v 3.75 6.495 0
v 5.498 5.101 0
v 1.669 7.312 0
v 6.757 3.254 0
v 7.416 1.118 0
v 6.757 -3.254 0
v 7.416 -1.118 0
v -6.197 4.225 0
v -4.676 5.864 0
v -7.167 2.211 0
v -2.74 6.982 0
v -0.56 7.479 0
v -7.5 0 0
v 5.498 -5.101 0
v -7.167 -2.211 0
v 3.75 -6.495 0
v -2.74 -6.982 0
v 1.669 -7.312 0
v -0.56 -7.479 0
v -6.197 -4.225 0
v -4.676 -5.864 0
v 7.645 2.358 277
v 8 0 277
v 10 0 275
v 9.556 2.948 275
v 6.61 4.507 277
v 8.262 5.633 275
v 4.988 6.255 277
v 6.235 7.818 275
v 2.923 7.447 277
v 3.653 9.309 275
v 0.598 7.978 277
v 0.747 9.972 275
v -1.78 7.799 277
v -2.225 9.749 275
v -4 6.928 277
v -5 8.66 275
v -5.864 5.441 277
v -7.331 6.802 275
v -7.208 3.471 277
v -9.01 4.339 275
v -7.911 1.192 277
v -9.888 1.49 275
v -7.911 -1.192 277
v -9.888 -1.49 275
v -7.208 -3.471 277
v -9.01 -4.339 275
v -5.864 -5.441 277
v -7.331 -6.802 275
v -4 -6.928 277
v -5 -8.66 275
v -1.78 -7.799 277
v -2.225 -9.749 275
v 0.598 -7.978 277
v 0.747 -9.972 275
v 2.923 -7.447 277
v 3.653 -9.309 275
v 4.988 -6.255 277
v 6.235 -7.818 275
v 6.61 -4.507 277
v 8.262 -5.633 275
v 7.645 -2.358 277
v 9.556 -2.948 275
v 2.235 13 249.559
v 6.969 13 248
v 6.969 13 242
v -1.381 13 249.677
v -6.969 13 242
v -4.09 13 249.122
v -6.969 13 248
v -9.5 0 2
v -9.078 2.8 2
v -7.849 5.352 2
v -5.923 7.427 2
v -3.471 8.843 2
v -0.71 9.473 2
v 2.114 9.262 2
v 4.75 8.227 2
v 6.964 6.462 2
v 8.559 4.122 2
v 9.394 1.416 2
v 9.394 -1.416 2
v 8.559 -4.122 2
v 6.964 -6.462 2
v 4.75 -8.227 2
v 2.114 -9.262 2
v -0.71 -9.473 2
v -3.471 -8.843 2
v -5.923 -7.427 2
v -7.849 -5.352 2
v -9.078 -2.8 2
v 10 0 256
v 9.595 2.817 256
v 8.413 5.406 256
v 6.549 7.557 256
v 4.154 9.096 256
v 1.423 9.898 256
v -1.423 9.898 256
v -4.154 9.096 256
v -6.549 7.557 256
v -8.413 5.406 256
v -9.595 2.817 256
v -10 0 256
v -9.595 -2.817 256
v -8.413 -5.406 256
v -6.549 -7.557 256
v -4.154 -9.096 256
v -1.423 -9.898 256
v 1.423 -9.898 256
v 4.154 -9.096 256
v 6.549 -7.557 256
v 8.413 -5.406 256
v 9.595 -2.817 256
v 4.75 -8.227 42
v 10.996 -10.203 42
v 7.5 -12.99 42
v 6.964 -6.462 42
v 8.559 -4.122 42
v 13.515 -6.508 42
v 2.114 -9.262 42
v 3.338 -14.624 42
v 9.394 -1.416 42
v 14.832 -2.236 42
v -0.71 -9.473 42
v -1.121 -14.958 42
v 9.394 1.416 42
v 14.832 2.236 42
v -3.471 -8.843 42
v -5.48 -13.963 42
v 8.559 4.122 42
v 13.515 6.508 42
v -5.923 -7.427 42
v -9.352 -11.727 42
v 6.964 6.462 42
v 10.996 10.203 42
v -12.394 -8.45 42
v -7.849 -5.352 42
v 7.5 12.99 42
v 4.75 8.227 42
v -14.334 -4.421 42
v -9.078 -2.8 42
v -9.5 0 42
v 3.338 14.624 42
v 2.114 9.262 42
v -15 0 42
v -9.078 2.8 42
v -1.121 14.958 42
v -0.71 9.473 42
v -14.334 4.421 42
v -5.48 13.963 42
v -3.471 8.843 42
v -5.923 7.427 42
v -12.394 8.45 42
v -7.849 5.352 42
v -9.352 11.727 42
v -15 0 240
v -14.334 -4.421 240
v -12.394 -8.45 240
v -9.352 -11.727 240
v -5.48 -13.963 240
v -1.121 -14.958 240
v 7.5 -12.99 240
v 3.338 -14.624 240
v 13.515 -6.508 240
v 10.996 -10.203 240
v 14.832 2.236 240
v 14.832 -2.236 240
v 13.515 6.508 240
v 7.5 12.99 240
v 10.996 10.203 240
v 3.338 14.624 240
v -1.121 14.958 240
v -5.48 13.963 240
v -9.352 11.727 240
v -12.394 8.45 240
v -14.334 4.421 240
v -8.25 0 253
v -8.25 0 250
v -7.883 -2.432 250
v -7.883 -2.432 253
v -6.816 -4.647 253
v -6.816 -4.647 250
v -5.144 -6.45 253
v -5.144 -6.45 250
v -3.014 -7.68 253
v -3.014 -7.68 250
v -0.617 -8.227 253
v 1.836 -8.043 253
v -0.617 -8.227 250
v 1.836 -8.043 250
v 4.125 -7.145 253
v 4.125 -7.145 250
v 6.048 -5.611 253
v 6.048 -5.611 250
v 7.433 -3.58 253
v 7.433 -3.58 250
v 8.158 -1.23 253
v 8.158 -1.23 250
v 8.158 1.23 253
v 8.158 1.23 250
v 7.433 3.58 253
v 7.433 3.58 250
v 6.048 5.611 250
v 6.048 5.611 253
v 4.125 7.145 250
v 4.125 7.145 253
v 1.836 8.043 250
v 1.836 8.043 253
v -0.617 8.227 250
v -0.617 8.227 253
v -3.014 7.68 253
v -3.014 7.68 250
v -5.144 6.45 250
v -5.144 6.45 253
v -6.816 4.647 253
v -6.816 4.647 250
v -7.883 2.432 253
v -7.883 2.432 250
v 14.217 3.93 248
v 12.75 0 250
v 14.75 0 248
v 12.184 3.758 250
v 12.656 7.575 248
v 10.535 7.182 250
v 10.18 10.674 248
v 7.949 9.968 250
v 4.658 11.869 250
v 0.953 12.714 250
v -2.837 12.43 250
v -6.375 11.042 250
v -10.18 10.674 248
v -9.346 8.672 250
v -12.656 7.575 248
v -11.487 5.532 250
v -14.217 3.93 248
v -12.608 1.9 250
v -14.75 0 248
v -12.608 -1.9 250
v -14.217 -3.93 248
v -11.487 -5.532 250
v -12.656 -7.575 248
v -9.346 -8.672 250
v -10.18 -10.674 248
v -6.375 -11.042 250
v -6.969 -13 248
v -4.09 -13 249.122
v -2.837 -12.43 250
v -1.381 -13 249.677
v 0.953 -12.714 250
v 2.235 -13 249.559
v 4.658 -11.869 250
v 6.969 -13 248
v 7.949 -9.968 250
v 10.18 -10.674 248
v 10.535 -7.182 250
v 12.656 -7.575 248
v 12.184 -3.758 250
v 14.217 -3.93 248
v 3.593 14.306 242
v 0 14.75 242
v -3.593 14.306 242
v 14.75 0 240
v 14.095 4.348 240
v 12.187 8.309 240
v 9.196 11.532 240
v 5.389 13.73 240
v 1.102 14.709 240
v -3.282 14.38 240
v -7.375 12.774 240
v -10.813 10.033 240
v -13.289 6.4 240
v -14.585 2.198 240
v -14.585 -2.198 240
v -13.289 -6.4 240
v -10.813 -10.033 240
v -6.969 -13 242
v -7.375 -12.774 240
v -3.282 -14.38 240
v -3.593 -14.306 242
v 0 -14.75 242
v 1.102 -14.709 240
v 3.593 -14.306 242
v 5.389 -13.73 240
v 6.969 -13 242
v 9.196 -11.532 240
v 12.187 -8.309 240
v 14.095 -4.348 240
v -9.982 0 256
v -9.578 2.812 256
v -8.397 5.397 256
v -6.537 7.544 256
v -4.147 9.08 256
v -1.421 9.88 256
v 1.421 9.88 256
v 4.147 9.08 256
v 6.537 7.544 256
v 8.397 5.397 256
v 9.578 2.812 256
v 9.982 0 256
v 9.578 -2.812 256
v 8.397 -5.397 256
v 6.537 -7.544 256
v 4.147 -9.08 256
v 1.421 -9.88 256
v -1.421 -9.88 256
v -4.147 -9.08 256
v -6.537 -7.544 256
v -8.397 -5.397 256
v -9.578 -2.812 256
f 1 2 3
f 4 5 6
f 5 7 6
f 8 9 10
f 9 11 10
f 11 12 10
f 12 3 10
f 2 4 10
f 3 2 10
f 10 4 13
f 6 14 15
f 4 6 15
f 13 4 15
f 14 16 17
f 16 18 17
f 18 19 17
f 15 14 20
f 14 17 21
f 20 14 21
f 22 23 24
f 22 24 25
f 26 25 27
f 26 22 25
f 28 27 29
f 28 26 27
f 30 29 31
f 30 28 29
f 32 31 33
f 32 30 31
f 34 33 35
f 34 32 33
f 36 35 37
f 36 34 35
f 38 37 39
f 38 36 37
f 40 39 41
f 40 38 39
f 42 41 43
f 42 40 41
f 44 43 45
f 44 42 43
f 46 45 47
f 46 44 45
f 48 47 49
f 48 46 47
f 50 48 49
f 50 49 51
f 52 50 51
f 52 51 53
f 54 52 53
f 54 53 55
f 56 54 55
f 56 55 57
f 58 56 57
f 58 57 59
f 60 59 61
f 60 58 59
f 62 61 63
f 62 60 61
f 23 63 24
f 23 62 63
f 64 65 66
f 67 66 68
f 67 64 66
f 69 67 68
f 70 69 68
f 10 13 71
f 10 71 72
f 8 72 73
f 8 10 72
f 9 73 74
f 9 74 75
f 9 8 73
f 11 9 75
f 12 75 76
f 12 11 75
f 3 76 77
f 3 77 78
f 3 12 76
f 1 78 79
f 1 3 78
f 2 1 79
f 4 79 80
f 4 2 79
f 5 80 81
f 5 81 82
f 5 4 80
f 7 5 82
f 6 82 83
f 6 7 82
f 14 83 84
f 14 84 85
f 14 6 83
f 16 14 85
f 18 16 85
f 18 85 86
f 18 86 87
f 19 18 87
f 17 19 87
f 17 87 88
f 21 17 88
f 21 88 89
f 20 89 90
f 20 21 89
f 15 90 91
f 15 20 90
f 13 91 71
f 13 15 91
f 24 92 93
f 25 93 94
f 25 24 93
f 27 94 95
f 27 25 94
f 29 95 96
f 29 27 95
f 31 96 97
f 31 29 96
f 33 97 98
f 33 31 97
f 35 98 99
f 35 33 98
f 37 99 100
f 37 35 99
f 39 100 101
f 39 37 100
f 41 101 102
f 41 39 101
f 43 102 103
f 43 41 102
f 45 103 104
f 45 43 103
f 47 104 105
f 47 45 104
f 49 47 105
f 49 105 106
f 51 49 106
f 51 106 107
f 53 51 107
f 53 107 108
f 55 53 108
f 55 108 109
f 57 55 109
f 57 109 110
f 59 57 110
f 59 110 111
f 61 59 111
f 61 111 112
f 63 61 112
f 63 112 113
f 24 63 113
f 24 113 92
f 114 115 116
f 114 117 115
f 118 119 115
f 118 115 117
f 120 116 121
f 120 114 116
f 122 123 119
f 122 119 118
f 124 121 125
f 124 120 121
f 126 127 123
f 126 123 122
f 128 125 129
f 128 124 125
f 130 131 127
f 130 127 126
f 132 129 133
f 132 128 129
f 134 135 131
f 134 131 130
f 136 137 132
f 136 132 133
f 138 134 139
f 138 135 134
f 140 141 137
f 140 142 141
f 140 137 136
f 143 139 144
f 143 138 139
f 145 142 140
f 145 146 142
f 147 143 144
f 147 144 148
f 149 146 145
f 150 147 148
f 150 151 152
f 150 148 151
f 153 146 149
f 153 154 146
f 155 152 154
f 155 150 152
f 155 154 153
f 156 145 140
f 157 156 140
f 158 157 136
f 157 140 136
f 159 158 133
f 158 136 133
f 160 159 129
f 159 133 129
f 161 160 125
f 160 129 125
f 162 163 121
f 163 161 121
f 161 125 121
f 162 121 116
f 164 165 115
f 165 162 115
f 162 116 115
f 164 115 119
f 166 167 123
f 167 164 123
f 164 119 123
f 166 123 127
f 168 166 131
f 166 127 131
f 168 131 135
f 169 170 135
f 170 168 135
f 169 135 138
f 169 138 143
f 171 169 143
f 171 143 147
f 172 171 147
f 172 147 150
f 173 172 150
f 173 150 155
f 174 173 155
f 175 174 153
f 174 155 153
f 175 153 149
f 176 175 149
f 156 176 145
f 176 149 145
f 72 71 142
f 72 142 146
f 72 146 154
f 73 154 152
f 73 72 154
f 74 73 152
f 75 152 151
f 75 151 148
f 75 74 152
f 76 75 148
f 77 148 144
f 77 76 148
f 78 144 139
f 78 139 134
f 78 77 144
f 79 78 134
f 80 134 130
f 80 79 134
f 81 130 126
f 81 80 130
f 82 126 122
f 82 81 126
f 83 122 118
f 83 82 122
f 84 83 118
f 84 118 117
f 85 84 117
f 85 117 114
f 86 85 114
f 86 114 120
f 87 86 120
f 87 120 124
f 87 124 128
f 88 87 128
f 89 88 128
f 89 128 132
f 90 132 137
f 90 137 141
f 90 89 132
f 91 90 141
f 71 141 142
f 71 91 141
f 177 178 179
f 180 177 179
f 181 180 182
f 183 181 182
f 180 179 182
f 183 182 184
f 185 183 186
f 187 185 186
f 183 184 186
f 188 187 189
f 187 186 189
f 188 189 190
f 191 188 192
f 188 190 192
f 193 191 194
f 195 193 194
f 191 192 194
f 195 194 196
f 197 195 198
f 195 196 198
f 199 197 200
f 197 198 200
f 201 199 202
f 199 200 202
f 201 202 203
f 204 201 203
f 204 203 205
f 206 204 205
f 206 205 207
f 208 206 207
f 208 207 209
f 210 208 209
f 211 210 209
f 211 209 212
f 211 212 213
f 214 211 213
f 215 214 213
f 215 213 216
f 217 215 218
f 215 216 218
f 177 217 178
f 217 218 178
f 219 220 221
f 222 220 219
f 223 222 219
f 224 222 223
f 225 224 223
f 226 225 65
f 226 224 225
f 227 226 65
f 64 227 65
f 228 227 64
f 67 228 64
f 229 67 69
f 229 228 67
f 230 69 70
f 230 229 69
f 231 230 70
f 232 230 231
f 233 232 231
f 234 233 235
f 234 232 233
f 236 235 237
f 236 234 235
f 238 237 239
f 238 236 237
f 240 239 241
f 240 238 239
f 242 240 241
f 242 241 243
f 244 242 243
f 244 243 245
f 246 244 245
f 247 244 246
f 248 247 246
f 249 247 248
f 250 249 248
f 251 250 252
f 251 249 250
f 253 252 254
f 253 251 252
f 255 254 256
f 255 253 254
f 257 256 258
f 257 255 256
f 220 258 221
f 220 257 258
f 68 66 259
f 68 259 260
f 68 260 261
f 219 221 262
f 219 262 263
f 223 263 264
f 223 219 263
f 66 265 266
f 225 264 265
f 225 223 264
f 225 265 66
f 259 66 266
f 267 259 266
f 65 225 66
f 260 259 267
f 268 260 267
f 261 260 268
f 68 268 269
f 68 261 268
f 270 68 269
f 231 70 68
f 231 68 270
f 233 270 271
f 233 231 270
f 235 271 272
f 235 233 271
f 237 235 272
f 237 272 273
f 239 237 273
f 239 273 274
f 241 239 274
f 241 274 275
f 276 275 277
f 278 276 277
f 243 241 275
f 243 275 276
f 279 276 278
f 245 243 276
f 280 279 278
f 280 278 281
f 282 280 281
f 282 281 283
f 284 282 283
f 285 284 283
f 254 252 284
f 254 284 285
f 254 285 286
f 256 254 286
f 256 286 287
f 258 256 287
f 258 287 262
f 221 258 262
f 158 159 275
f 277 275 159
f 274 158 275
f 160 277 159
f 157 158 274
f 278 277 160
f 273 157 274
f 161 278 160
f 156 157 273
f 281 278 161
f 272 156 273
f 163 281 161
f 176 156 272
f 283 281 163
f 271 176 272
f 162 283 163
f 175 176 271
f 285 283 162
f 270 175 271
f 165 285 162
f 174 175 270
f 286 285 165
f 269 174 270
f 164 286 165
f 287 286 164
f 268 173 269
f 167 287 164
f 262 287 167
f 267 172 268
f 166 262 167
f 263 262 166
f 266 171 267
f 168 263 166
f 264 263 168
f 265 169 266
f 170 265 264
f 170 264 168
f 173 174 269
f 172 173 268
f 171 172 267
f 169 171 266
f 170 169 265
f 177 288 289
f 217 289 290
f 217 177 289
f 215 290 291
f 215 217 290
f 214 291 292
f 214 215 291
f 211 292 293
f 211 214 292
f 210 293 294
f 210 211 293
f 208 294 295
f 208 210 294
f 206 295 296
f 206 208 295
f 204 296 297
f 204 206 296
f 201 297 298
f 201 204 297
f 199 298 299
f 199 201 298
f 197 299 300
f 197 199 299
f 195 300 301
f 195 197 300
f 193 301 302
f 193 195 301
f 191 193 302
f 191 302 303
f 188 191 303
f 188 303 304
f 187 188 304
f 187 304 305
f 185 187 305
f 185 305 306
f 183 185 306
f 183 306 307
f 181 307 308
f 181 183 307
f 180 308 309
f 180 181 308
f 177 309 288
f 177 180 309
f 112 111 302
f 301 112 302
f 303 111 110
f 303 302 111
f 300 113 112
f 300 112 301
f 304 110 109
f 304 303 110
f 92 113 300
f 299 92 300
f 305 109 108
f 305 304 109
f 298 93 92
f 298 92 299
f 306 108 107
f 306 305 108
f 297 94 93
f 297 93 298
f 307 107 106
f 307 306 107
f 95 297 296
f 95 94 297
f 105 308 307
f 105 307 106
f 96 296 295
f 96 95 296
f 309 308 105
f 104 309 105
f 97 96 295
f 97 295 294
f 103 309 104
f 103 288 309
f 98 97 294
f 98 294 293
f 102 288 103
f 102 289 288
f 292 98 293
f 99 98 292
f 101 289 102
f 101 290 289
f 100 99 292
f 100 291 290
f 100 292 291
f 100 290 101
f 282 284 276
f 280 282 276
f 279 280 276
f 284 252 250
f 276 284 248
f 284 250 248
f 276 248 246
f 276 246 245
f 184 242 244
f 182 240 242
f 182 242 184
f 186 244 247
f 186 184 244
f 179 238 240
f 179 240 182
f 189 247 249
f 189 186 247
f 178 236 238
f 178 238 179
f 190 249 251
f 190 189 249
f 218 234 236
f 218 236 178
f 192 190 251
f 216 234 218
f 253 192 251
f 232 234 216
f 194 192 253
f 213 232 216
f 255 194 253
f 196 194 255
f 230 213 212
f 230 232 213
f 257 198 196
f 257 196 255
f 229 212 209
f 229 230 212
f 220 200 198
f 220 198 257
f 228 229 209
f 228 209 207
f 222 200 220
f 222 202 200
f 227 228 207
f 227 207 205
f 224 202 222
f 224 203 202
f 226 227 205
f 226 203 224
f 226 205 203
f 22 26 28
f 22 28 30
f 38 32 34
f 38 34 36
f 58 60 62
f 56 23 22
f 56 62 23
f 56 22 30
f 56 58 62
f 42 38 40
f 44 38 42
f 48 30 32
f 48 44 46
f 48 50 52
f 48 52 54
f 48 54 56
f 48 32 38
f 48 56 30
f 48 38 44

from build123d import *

# Parameters (mm, degrees)
ESQUISSE1_R                   = 15
TIGE_DEPTH                    = 277
ESQUISSE2_OUTSIDE_W           = 88.046
ESQUISSE2_OUTSIDE_H           = 88.046
ESQUISSE2_OUTSIDE_R           = 14.75
CENTRAGE_DE_CHAPE_DEPTH       = 37
ESQUISSE3_OUTSIDE_W           = 88.046
ESQUISSE3_OUTSIDE_H           = 88.046
ESQUISSE3_OUTSIDE_R           = 10
DIAM_TRE_DE_FILETAGE_DEPTH    = 27
ESQUISSE4_OUTSIDE_W           = 88.046
ESQUISSE4_OUTSIDE_H           = 88.046
ESQUISSE4_OUTSIDE_R           = 8.25
GORGE_DE_D_GAGEMENT_DEPTH     = 3
ESQUISSE5_OUTSIDE_W           = 91.51
ESQUISSE5_OUTSIDE_H           = 91.51
ESQUISSE5_OUTSIDE_R           = 8.25
CHANFREIN_DE_D_GAGEMENT_DEPTH = 3
CHANFREIN_DE_D_GAGEMENT_DRAFT = -30
CHANFREIN4_SIZE               = 2
M_PLAT_1_REACH                = 280.815
ESQUISSE6_W                   = 29.5
ESQUISSE6_H                   = 8
ESQUISSE7_OUTSIDE_W           = 88.046
ESQUISSE7_OUTSIDE_H           = 88.046
ESQUISSE7_OUTSIDE_R           = 9.5
CENTRAGE_DE_PISTON_DEPTH      = 42
CHANFREIN_DE_FILETAGE_SIZE    = 2


with BuildPart() as part:
    # Esquisse1 → tige (new body)
    with BuildSketch(Plane.XY):
        with Locations(Location((0, 0, 0), (0, 0, 180))):
            Circle(ESQUISSE1_R)
    extrude(amount=TIGE_DEPTH)

    # Esquisse2 outside → centrage de chape (cut)
    with BuildSketch(Plane.XY.offset(277)):
        Rectangle(ESQUISSE2_OUTSIDE_W, ESQUISSE2_OUTSIDE_H)
        Circle(ESQUISSE2_OUTSIDE_R, mode=Mode.SUBTRACT)
    extrude(amount=-CENTRAGE_DE_CHAPE_DEPTH, mode=Mode.SUBTRACT)

    # Esquisse3 outside → diamètre de filetage (cut)
    with BuildSketch(Plane.XY.offset(277)):
        Rectangle(ESQUISSE3_OUTSIDE_W, ESQUISSE3_OUTSIDE_H)
        Circle(ESQUISSE3_OUTSIDE_R, mode=Mode.SUBTRACT)
    extrude(amount=-DIAM_TRE_DE_FILETAGE_DEPTH, mode=Mode.SUBTRACT)

    # Esquisse4 outside → gorge de d_gagement (cut)
    with BuildSketch(Plane.XY.offset(250)):
        Rectangle(ESQUISSE4_OUTSIDE_W, ESQUISSE4_OUTSIDE_H)
        with Locations(Location((0, 0, 0), (0, 0, 180))):
            Circle(ESQUISSE4_OUTSIDE_R, mode=Mode.SUBTRACT)
    extrude(amount=GORGE_DE_D_GAGEMENT_DEPTH, mode=Mode.SUBTRACT)


with BuildPart() as chanfrein_de_d_gagement_tool:
    # Esquisse5 outside → chanfrein de dégagement (with draft: the straight prism first)
    with BuildSketch(Plane(origin=(0, 0, 253), x_dir=(-1, 0, 0), z_dir=(0, 0, -1))):
        Rectangle(ESQUISSE5_OUTSIDE_W, ESQUISSE5_OUTSIDE_H)
        Circle(ESQUISSE5_OUTSIDE_R, mode=Mode.SUBTRACT)
    extrude(amount=-CHANFREIN_DE_D_GAGEMENT_DEPTH)
    # chanfrein de dégagement: the draft: its side faces are tilted about the plane it starts from
    chanfrein_de_d_gagement_sides = [chanfrein_de_d_gagement_tool.faces().sort_by_distance(p)[0] for p in [
        (0, -45.755, 254.5),
        (-45.755, 0, 254.5),
        (0, 45.755, 254.5),
        (45.755, 0, 254.5),
        (8.25, 0, 254.5),
    ]]
    draft(chanfrein_de_d_gagement_sides, Plane(origin=(0, 0, 253), x_dir=(-1, 0, 0), z_dir=(0, 0, -1)), CHANFREIN_DE_D_GAGEMENT_DRAFT)


with BuildPart() as part_1:
    add(part.part)

    # chanfrein de dégagement: cut by chanfrein_de_d_gagement_tool
    add(chanfrein_de_d_gagement_tool.part, mode=Mode.SUBTRACT)

    # Chanfrein4
    chanfrein4_edges = [part_1.edges().sort_by_distance(p)[0] for p in [
        (-14.75, 0, 250),
        (-10, 0, 277),
    ]]
    chamfer(chanfrein4_edges, length=CHANFREIN4_SIZE)

    # Esquisse6 → méplat 1 (cut, up to next)
    with BuildSketch(Plane(origin=(0, 13, 0), x_dir=(-1, 0, 0), z_dir=(0, 1, 0)), mode=Mode.PRIVATE) as m_plat_1_sk1:
        with Locations((0, 246)):
            Rectangle(ESQUISSE6_W, ESQUISSE6_H)
    m_plat_1_tool1 = extrude(m_plat_1_sk1.sketch, amount=M_PLAT_1_REACH, mode=Mode.PRIVATE) & part_1.part
    m_plat_1 = m_plat_1_tool1.solids().sort_by_distance((0, 13, 246))[0]
    add(m_plat_1, mode=Mode.SUBTRACT)

    # méplat 2: méplat 1 across plane
    add(m_plat_1.mirror(Plane.ZX), mode=Mode.SUBTRACT)

    # Esquisse7 outside → centrage de piston (cut)
    with BuildSketch(Plane(origin=(0, 0, 0), x_dir=(-1, 0, 0), z_dir=(0, 0, -1))):
        Rectangle(ESQUISSE7_OUTSIDE_W, ESQUISSE7_OUTSIDE_H)
        Circle(ESQUISSE7_OUTSIDE_R, mode=Mode.SUBTRACT)
    extrude(amount=-CENTRAGE_DE_PISTON_DEPTH, mode=Mode.SUBTRACT)

    # Chanfrein de filetage
    chanfrein_de_filetage_edges = [part_1.edges().sort_by_distance(p)[0] for p in [
        (9.5, 0, 0),
    ]]
    chamfer(chanfrein_de_filetage_edges, length=CHANFREIN_DE_FILETAGE_SIZE)


solid = part_1.part
